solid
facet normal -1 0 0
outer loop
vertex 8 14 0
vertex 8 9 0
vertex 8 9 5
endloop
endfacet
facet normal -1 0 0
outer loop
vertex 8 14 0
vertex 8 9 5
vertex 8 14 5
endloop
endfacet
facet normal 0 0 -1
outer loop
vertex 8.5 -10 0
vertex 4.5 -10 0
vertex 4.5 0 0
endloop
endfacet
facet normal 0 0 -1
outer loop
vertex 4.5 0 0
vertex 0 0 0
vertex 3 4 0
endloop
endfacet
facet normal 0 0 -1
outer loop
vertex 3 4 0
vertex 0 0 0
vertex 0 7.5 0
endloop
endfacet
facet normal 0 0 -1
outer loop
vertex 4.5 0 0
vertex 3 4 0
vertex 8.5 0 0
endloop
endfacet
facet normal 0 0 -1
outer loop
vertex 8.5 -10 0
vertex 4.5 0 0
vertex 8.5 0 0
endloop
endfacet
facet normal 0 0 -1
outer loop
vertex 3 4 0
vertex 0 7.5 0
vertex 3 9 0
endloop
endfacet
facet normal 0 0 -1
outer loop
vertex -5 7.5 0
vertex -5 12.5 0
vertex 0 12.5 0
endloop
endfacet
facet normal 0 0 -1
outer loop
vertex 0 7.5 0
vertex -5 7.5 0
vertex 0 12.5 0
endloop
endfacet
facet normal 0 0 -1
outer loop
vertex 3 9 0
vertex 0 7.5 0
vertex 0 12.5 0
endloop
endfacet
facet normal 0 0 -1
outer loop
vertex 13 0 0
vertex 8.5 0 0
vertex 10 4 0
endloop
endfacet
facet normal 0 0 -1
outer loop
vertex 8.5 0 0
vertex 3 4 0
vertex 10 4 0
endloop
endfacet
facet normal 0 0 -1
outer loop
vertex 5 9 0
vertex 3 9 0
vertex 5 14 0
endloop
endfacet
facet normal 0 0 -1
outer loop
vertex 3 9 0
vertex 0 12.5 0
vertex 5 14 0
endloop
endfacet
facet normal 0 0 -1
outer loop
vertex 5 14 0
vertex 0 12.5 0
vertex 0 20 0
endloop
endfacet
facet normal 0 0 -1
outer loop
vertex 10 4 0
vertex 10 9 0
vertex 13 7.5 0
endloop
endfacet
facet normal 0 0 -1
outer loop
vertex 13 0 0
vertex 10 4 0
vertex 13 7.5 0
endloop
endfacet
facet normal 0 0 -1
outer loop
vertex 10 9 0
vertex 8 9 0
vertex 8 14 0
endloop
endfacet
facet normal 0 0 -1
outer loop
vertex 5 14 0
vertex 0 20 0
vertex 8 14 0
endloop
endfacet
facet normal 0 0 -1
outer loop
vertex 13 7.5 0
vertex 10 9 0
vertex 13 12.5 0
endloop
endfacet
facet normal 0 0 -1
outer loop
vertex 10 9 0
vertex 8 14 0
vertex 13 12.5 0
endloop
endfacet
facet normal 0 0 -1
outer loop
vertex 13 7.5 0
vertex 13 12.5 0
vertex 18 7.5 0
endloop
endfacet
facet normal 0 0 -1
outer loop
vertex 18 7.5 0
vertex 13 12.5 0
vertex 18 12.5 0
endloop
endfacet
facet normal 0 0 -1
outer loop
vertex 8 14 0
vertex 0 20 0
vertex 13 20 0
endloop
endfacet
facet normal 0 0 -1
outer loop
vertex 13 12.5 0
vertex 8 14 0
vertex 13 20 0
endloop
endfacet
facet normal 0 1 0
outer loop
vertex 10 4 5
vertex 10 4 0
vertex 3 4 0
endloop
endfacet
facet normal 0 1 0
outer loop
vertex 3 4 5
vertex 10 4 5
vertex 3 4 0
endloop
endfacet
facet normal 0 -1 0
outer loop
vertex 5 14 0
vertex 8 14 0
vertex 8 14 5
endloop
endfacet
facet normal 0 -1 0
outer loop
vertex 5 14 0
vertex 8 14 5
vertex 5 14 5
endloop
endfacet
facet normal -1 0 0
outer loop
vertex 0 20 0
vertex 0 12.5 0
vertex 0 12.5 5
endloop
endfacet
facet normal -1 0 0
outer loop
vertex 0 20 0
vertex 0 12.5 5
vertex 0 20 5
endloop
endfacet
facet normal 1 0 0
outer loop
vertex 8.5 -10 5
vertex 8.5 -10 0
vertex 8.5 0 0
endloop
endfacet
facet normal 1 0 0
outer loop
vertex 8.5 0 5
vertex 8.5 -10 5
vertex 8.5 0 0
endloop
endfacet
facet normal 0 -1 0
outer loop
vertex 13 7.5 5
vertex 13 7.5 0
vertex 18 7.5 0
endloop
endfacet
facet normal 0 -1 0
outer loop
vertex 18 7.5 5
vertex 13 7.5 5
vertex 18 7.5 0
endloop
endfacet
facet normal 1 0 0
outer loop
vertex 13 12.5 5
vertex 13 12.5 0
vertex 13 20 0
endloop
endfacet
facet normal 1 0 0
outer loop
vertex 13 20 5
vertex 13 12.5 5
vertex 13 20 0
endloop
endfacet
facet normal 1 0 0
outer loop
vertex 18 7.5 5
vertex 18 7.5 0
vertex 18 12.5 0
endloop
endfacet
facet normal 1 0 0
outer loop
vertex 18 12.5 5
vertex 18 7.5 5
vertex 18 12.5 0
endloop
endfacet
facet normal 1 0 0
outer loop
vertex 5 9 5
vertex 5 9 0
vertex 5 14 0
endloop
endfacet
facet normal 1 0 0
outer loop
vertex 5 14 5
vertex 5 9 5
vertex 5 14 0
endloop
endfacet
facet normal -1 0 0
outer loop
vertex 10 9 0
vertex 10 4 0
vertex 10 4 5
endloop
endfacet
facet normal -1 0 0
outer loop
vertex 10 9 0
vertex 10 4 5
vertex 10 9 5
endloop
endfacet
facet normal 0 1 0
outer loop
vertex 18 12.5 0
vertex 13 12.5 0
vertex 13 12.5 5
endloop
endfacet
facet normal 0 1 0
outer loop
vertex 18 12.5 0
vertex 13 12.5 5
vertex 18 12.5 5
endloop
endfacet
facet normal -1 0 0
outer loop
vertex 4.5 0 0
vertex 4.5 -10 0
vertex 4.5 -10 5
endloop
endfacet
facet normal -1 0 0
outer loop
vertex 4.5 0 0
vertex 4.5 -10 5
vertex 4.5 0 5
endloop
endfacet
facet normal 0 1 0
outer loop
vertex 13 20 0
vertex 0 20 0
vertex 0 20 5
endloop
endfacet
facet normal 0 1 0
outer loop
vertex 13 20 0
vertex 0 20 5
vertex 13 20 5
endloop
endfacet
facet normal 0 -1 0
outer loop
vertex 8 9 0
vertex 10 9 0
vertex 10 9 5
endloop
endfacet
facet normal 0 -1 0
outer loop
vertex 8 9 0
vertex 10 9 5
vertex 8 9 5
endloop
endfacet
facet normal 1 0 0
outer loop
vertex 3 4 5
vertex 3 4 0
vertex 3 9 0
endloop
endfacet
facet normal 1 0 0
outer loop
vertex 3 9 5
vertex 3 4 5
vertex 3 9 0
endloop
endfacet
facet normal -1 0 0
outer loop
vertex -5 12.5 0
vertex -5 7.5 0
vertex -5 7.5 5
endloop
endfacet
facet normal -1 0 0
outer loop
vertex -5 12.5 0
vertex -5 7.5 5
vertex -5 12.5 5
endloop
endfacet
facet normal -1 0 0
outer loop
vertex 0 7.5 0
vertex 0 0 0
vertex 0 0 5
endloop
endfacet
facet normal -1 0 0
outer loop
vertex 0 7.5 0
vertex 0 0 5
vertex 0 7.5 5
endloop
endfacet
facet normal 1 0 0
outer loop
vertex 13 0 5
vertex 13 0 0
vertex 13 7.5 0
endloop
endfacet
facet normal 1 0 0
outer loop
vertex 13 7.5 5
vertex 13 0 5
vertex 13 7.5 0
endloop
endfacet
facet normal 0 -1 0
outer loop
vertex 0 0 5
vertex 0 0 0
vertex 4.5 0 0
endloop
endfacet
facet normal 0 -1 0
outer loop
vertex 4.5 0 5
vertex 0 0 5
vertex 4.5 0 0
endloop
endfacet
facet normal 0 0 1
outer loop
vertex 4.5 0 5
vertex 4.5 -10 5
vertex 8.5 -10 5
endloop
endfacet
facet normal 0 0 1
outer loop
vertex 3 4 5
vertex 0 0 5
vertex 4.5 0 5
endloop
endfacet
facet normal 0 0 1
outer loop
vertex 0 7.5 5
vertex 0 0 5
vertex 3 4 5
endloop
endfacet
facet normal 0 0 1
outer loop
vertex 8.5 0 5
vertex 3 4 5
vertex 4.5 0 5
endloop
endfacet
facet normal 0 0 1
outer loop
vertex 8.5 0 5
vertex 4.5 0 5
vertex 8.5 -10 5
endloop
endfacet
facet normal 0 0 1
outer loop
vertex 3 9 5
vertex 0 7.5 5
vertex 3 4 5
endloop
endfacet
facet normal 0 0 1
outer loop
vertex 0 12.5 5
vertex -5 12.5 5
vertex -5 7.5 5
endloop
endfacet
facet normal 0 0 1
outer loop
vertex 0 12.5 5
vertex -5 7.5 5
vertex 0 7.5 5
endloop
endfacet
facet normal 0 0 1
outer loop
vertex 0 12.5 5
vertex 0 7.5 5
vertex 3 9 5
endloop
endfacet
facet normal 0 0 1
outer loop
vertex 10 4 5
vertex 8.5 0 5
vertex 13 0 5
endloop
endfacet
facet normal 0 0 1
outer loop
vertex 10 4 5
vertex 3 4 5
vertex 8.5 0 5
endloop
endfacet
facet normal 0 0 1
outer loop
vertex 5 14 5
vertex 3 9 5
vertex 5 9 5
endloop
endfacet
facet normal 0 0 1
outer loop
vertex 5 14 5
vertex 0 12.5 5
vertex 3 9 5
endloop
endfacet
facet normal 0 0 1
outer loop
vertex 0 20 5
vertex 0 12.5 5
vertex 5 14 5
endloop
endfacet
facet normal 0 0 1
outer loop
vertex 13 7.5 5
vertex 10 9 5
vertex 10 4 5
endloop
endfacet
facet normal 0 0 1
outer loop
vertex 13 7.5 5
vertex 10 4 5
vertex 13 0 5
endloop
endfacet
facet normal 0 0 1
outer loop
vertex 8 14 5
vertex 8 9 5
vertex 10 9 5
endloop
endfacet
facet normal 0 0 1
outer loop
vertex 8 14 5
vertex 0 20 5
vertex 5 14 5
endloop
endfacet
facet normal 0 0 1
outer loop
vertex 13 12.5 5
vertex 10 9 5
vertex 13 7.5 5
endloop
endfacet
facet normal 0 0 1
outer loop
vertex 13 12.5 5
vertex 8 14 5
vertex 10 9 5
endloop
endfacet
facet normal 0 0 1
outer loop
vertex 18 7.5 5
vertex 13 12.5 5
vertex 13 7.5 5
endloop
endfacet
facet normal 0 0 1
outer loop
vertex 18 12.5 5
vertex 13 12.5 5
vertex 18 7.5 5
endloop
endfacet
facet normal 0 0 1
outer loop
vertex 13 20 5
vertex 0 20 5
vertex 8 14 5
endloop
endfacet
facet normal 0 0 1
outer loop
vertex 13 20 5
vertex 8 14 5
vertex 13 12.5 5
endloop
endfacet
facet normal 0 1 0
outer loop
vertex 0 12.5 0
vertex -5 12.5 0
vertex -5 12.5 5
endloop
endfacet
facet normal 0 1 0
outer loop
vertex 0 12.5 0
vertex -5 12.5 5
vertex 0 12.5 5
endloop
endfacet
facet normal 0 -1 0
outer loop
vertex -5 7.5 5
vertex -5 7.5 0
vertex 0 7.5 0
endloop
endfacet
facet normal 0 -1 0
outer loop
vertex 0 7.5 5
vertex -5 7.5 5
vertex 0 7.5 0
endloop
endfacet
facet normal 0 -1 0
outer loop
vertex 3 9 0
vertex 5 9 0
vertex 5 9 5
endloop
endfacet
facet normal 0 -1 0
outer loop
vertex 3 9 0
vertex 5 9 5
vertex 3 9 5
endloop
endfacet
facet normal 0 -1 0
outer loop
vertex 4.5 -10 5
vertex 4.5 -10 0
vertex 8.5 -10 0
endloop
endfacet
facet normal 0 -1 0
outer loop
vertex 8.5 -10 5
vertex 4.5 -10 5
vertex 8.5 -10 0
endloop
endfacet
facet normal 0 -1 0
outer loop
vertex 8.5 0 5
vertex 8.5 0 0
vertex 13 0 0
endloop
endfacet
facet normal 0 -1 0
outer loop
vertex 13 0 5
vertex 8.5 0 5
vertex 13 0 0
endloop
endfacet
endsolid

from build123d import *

# Parameters (mm, degrees)
ESQUISSE1_W             = 4
ESQUISSE1_H             = 10
ESQUISSE1_W_2           = 5
ESQUISSE1_H_2           = 5
ESQUISSE1_W_3           = 13
ESQUISSE1_H_3           = 20
BOSS_EXTRU_1_DEPTH      = 5
ESQUISSE2_W             = 7
ESQUISSE2_H             = 5
ENL_V_MAT_EXTRU_1_DEPTH = 10
ESQUISSE3_W             = 3
ESQUISSE3_H             = 10
ENL_V_MAT_EXTRU_2_DEPTH = 10


with BuildPart() as part:
    # Esquisse1 → Boss.-Extru.1 (new body)
    with BuildSketch(Plane.XY):
        with Locations((6.5, -5)):
            Rectangle(ESQUISSE1_W, ESQUISSE1_H)
        with Locations((-2.5, 10)):
            Rectangle(ESQUISSE1_W_2, ESQUISSE1_H_2)
        with Locations((6.5, 10)):
            Rectangle(ESQUISSE1_W_3, ESQUISSE1_H_3)
        with Locations((15.5, 10)):
            Rectangle(ESQUISSE1_W_2, ESQUISSE1_H_2)
    extrude(amount=BOSS_EXTRU_1_DEPTH)

    # Esquisse2 → Enlèv. mat.-Extru.1 (cut)
    with BuildSketch(Plane(origin=(0, 0, 0), x_dir=(-1, 0, 0), z_dir=(0, 0, -1))):
        with Locations((-6.5, 6.5)):
            Rectangle(ESQUISSE2_W, ESQUISSE2_H)
    extrude(amount=-ENL_V_MAT_EXTRU_1_DEPTH, mode=Mode.SUBTRACT)

    # Esquisse3 → Enlèv. mat.-Extru.2 (cut)
    with BuildSketch(Plane(origin=(0, 0, 0), x_dir=(-1, 0, 0), z_dir=(0, 0, -1))):
        with Locations((-6.5, 9)):
            Rectangle(ESQUISSE3_W, ESQUISSE3_H)
    extrude(amount=-ENL_V_MAT_EXTRU_2_DEPTH, mode=Mode.SUBTRACT)


solid = part.part
